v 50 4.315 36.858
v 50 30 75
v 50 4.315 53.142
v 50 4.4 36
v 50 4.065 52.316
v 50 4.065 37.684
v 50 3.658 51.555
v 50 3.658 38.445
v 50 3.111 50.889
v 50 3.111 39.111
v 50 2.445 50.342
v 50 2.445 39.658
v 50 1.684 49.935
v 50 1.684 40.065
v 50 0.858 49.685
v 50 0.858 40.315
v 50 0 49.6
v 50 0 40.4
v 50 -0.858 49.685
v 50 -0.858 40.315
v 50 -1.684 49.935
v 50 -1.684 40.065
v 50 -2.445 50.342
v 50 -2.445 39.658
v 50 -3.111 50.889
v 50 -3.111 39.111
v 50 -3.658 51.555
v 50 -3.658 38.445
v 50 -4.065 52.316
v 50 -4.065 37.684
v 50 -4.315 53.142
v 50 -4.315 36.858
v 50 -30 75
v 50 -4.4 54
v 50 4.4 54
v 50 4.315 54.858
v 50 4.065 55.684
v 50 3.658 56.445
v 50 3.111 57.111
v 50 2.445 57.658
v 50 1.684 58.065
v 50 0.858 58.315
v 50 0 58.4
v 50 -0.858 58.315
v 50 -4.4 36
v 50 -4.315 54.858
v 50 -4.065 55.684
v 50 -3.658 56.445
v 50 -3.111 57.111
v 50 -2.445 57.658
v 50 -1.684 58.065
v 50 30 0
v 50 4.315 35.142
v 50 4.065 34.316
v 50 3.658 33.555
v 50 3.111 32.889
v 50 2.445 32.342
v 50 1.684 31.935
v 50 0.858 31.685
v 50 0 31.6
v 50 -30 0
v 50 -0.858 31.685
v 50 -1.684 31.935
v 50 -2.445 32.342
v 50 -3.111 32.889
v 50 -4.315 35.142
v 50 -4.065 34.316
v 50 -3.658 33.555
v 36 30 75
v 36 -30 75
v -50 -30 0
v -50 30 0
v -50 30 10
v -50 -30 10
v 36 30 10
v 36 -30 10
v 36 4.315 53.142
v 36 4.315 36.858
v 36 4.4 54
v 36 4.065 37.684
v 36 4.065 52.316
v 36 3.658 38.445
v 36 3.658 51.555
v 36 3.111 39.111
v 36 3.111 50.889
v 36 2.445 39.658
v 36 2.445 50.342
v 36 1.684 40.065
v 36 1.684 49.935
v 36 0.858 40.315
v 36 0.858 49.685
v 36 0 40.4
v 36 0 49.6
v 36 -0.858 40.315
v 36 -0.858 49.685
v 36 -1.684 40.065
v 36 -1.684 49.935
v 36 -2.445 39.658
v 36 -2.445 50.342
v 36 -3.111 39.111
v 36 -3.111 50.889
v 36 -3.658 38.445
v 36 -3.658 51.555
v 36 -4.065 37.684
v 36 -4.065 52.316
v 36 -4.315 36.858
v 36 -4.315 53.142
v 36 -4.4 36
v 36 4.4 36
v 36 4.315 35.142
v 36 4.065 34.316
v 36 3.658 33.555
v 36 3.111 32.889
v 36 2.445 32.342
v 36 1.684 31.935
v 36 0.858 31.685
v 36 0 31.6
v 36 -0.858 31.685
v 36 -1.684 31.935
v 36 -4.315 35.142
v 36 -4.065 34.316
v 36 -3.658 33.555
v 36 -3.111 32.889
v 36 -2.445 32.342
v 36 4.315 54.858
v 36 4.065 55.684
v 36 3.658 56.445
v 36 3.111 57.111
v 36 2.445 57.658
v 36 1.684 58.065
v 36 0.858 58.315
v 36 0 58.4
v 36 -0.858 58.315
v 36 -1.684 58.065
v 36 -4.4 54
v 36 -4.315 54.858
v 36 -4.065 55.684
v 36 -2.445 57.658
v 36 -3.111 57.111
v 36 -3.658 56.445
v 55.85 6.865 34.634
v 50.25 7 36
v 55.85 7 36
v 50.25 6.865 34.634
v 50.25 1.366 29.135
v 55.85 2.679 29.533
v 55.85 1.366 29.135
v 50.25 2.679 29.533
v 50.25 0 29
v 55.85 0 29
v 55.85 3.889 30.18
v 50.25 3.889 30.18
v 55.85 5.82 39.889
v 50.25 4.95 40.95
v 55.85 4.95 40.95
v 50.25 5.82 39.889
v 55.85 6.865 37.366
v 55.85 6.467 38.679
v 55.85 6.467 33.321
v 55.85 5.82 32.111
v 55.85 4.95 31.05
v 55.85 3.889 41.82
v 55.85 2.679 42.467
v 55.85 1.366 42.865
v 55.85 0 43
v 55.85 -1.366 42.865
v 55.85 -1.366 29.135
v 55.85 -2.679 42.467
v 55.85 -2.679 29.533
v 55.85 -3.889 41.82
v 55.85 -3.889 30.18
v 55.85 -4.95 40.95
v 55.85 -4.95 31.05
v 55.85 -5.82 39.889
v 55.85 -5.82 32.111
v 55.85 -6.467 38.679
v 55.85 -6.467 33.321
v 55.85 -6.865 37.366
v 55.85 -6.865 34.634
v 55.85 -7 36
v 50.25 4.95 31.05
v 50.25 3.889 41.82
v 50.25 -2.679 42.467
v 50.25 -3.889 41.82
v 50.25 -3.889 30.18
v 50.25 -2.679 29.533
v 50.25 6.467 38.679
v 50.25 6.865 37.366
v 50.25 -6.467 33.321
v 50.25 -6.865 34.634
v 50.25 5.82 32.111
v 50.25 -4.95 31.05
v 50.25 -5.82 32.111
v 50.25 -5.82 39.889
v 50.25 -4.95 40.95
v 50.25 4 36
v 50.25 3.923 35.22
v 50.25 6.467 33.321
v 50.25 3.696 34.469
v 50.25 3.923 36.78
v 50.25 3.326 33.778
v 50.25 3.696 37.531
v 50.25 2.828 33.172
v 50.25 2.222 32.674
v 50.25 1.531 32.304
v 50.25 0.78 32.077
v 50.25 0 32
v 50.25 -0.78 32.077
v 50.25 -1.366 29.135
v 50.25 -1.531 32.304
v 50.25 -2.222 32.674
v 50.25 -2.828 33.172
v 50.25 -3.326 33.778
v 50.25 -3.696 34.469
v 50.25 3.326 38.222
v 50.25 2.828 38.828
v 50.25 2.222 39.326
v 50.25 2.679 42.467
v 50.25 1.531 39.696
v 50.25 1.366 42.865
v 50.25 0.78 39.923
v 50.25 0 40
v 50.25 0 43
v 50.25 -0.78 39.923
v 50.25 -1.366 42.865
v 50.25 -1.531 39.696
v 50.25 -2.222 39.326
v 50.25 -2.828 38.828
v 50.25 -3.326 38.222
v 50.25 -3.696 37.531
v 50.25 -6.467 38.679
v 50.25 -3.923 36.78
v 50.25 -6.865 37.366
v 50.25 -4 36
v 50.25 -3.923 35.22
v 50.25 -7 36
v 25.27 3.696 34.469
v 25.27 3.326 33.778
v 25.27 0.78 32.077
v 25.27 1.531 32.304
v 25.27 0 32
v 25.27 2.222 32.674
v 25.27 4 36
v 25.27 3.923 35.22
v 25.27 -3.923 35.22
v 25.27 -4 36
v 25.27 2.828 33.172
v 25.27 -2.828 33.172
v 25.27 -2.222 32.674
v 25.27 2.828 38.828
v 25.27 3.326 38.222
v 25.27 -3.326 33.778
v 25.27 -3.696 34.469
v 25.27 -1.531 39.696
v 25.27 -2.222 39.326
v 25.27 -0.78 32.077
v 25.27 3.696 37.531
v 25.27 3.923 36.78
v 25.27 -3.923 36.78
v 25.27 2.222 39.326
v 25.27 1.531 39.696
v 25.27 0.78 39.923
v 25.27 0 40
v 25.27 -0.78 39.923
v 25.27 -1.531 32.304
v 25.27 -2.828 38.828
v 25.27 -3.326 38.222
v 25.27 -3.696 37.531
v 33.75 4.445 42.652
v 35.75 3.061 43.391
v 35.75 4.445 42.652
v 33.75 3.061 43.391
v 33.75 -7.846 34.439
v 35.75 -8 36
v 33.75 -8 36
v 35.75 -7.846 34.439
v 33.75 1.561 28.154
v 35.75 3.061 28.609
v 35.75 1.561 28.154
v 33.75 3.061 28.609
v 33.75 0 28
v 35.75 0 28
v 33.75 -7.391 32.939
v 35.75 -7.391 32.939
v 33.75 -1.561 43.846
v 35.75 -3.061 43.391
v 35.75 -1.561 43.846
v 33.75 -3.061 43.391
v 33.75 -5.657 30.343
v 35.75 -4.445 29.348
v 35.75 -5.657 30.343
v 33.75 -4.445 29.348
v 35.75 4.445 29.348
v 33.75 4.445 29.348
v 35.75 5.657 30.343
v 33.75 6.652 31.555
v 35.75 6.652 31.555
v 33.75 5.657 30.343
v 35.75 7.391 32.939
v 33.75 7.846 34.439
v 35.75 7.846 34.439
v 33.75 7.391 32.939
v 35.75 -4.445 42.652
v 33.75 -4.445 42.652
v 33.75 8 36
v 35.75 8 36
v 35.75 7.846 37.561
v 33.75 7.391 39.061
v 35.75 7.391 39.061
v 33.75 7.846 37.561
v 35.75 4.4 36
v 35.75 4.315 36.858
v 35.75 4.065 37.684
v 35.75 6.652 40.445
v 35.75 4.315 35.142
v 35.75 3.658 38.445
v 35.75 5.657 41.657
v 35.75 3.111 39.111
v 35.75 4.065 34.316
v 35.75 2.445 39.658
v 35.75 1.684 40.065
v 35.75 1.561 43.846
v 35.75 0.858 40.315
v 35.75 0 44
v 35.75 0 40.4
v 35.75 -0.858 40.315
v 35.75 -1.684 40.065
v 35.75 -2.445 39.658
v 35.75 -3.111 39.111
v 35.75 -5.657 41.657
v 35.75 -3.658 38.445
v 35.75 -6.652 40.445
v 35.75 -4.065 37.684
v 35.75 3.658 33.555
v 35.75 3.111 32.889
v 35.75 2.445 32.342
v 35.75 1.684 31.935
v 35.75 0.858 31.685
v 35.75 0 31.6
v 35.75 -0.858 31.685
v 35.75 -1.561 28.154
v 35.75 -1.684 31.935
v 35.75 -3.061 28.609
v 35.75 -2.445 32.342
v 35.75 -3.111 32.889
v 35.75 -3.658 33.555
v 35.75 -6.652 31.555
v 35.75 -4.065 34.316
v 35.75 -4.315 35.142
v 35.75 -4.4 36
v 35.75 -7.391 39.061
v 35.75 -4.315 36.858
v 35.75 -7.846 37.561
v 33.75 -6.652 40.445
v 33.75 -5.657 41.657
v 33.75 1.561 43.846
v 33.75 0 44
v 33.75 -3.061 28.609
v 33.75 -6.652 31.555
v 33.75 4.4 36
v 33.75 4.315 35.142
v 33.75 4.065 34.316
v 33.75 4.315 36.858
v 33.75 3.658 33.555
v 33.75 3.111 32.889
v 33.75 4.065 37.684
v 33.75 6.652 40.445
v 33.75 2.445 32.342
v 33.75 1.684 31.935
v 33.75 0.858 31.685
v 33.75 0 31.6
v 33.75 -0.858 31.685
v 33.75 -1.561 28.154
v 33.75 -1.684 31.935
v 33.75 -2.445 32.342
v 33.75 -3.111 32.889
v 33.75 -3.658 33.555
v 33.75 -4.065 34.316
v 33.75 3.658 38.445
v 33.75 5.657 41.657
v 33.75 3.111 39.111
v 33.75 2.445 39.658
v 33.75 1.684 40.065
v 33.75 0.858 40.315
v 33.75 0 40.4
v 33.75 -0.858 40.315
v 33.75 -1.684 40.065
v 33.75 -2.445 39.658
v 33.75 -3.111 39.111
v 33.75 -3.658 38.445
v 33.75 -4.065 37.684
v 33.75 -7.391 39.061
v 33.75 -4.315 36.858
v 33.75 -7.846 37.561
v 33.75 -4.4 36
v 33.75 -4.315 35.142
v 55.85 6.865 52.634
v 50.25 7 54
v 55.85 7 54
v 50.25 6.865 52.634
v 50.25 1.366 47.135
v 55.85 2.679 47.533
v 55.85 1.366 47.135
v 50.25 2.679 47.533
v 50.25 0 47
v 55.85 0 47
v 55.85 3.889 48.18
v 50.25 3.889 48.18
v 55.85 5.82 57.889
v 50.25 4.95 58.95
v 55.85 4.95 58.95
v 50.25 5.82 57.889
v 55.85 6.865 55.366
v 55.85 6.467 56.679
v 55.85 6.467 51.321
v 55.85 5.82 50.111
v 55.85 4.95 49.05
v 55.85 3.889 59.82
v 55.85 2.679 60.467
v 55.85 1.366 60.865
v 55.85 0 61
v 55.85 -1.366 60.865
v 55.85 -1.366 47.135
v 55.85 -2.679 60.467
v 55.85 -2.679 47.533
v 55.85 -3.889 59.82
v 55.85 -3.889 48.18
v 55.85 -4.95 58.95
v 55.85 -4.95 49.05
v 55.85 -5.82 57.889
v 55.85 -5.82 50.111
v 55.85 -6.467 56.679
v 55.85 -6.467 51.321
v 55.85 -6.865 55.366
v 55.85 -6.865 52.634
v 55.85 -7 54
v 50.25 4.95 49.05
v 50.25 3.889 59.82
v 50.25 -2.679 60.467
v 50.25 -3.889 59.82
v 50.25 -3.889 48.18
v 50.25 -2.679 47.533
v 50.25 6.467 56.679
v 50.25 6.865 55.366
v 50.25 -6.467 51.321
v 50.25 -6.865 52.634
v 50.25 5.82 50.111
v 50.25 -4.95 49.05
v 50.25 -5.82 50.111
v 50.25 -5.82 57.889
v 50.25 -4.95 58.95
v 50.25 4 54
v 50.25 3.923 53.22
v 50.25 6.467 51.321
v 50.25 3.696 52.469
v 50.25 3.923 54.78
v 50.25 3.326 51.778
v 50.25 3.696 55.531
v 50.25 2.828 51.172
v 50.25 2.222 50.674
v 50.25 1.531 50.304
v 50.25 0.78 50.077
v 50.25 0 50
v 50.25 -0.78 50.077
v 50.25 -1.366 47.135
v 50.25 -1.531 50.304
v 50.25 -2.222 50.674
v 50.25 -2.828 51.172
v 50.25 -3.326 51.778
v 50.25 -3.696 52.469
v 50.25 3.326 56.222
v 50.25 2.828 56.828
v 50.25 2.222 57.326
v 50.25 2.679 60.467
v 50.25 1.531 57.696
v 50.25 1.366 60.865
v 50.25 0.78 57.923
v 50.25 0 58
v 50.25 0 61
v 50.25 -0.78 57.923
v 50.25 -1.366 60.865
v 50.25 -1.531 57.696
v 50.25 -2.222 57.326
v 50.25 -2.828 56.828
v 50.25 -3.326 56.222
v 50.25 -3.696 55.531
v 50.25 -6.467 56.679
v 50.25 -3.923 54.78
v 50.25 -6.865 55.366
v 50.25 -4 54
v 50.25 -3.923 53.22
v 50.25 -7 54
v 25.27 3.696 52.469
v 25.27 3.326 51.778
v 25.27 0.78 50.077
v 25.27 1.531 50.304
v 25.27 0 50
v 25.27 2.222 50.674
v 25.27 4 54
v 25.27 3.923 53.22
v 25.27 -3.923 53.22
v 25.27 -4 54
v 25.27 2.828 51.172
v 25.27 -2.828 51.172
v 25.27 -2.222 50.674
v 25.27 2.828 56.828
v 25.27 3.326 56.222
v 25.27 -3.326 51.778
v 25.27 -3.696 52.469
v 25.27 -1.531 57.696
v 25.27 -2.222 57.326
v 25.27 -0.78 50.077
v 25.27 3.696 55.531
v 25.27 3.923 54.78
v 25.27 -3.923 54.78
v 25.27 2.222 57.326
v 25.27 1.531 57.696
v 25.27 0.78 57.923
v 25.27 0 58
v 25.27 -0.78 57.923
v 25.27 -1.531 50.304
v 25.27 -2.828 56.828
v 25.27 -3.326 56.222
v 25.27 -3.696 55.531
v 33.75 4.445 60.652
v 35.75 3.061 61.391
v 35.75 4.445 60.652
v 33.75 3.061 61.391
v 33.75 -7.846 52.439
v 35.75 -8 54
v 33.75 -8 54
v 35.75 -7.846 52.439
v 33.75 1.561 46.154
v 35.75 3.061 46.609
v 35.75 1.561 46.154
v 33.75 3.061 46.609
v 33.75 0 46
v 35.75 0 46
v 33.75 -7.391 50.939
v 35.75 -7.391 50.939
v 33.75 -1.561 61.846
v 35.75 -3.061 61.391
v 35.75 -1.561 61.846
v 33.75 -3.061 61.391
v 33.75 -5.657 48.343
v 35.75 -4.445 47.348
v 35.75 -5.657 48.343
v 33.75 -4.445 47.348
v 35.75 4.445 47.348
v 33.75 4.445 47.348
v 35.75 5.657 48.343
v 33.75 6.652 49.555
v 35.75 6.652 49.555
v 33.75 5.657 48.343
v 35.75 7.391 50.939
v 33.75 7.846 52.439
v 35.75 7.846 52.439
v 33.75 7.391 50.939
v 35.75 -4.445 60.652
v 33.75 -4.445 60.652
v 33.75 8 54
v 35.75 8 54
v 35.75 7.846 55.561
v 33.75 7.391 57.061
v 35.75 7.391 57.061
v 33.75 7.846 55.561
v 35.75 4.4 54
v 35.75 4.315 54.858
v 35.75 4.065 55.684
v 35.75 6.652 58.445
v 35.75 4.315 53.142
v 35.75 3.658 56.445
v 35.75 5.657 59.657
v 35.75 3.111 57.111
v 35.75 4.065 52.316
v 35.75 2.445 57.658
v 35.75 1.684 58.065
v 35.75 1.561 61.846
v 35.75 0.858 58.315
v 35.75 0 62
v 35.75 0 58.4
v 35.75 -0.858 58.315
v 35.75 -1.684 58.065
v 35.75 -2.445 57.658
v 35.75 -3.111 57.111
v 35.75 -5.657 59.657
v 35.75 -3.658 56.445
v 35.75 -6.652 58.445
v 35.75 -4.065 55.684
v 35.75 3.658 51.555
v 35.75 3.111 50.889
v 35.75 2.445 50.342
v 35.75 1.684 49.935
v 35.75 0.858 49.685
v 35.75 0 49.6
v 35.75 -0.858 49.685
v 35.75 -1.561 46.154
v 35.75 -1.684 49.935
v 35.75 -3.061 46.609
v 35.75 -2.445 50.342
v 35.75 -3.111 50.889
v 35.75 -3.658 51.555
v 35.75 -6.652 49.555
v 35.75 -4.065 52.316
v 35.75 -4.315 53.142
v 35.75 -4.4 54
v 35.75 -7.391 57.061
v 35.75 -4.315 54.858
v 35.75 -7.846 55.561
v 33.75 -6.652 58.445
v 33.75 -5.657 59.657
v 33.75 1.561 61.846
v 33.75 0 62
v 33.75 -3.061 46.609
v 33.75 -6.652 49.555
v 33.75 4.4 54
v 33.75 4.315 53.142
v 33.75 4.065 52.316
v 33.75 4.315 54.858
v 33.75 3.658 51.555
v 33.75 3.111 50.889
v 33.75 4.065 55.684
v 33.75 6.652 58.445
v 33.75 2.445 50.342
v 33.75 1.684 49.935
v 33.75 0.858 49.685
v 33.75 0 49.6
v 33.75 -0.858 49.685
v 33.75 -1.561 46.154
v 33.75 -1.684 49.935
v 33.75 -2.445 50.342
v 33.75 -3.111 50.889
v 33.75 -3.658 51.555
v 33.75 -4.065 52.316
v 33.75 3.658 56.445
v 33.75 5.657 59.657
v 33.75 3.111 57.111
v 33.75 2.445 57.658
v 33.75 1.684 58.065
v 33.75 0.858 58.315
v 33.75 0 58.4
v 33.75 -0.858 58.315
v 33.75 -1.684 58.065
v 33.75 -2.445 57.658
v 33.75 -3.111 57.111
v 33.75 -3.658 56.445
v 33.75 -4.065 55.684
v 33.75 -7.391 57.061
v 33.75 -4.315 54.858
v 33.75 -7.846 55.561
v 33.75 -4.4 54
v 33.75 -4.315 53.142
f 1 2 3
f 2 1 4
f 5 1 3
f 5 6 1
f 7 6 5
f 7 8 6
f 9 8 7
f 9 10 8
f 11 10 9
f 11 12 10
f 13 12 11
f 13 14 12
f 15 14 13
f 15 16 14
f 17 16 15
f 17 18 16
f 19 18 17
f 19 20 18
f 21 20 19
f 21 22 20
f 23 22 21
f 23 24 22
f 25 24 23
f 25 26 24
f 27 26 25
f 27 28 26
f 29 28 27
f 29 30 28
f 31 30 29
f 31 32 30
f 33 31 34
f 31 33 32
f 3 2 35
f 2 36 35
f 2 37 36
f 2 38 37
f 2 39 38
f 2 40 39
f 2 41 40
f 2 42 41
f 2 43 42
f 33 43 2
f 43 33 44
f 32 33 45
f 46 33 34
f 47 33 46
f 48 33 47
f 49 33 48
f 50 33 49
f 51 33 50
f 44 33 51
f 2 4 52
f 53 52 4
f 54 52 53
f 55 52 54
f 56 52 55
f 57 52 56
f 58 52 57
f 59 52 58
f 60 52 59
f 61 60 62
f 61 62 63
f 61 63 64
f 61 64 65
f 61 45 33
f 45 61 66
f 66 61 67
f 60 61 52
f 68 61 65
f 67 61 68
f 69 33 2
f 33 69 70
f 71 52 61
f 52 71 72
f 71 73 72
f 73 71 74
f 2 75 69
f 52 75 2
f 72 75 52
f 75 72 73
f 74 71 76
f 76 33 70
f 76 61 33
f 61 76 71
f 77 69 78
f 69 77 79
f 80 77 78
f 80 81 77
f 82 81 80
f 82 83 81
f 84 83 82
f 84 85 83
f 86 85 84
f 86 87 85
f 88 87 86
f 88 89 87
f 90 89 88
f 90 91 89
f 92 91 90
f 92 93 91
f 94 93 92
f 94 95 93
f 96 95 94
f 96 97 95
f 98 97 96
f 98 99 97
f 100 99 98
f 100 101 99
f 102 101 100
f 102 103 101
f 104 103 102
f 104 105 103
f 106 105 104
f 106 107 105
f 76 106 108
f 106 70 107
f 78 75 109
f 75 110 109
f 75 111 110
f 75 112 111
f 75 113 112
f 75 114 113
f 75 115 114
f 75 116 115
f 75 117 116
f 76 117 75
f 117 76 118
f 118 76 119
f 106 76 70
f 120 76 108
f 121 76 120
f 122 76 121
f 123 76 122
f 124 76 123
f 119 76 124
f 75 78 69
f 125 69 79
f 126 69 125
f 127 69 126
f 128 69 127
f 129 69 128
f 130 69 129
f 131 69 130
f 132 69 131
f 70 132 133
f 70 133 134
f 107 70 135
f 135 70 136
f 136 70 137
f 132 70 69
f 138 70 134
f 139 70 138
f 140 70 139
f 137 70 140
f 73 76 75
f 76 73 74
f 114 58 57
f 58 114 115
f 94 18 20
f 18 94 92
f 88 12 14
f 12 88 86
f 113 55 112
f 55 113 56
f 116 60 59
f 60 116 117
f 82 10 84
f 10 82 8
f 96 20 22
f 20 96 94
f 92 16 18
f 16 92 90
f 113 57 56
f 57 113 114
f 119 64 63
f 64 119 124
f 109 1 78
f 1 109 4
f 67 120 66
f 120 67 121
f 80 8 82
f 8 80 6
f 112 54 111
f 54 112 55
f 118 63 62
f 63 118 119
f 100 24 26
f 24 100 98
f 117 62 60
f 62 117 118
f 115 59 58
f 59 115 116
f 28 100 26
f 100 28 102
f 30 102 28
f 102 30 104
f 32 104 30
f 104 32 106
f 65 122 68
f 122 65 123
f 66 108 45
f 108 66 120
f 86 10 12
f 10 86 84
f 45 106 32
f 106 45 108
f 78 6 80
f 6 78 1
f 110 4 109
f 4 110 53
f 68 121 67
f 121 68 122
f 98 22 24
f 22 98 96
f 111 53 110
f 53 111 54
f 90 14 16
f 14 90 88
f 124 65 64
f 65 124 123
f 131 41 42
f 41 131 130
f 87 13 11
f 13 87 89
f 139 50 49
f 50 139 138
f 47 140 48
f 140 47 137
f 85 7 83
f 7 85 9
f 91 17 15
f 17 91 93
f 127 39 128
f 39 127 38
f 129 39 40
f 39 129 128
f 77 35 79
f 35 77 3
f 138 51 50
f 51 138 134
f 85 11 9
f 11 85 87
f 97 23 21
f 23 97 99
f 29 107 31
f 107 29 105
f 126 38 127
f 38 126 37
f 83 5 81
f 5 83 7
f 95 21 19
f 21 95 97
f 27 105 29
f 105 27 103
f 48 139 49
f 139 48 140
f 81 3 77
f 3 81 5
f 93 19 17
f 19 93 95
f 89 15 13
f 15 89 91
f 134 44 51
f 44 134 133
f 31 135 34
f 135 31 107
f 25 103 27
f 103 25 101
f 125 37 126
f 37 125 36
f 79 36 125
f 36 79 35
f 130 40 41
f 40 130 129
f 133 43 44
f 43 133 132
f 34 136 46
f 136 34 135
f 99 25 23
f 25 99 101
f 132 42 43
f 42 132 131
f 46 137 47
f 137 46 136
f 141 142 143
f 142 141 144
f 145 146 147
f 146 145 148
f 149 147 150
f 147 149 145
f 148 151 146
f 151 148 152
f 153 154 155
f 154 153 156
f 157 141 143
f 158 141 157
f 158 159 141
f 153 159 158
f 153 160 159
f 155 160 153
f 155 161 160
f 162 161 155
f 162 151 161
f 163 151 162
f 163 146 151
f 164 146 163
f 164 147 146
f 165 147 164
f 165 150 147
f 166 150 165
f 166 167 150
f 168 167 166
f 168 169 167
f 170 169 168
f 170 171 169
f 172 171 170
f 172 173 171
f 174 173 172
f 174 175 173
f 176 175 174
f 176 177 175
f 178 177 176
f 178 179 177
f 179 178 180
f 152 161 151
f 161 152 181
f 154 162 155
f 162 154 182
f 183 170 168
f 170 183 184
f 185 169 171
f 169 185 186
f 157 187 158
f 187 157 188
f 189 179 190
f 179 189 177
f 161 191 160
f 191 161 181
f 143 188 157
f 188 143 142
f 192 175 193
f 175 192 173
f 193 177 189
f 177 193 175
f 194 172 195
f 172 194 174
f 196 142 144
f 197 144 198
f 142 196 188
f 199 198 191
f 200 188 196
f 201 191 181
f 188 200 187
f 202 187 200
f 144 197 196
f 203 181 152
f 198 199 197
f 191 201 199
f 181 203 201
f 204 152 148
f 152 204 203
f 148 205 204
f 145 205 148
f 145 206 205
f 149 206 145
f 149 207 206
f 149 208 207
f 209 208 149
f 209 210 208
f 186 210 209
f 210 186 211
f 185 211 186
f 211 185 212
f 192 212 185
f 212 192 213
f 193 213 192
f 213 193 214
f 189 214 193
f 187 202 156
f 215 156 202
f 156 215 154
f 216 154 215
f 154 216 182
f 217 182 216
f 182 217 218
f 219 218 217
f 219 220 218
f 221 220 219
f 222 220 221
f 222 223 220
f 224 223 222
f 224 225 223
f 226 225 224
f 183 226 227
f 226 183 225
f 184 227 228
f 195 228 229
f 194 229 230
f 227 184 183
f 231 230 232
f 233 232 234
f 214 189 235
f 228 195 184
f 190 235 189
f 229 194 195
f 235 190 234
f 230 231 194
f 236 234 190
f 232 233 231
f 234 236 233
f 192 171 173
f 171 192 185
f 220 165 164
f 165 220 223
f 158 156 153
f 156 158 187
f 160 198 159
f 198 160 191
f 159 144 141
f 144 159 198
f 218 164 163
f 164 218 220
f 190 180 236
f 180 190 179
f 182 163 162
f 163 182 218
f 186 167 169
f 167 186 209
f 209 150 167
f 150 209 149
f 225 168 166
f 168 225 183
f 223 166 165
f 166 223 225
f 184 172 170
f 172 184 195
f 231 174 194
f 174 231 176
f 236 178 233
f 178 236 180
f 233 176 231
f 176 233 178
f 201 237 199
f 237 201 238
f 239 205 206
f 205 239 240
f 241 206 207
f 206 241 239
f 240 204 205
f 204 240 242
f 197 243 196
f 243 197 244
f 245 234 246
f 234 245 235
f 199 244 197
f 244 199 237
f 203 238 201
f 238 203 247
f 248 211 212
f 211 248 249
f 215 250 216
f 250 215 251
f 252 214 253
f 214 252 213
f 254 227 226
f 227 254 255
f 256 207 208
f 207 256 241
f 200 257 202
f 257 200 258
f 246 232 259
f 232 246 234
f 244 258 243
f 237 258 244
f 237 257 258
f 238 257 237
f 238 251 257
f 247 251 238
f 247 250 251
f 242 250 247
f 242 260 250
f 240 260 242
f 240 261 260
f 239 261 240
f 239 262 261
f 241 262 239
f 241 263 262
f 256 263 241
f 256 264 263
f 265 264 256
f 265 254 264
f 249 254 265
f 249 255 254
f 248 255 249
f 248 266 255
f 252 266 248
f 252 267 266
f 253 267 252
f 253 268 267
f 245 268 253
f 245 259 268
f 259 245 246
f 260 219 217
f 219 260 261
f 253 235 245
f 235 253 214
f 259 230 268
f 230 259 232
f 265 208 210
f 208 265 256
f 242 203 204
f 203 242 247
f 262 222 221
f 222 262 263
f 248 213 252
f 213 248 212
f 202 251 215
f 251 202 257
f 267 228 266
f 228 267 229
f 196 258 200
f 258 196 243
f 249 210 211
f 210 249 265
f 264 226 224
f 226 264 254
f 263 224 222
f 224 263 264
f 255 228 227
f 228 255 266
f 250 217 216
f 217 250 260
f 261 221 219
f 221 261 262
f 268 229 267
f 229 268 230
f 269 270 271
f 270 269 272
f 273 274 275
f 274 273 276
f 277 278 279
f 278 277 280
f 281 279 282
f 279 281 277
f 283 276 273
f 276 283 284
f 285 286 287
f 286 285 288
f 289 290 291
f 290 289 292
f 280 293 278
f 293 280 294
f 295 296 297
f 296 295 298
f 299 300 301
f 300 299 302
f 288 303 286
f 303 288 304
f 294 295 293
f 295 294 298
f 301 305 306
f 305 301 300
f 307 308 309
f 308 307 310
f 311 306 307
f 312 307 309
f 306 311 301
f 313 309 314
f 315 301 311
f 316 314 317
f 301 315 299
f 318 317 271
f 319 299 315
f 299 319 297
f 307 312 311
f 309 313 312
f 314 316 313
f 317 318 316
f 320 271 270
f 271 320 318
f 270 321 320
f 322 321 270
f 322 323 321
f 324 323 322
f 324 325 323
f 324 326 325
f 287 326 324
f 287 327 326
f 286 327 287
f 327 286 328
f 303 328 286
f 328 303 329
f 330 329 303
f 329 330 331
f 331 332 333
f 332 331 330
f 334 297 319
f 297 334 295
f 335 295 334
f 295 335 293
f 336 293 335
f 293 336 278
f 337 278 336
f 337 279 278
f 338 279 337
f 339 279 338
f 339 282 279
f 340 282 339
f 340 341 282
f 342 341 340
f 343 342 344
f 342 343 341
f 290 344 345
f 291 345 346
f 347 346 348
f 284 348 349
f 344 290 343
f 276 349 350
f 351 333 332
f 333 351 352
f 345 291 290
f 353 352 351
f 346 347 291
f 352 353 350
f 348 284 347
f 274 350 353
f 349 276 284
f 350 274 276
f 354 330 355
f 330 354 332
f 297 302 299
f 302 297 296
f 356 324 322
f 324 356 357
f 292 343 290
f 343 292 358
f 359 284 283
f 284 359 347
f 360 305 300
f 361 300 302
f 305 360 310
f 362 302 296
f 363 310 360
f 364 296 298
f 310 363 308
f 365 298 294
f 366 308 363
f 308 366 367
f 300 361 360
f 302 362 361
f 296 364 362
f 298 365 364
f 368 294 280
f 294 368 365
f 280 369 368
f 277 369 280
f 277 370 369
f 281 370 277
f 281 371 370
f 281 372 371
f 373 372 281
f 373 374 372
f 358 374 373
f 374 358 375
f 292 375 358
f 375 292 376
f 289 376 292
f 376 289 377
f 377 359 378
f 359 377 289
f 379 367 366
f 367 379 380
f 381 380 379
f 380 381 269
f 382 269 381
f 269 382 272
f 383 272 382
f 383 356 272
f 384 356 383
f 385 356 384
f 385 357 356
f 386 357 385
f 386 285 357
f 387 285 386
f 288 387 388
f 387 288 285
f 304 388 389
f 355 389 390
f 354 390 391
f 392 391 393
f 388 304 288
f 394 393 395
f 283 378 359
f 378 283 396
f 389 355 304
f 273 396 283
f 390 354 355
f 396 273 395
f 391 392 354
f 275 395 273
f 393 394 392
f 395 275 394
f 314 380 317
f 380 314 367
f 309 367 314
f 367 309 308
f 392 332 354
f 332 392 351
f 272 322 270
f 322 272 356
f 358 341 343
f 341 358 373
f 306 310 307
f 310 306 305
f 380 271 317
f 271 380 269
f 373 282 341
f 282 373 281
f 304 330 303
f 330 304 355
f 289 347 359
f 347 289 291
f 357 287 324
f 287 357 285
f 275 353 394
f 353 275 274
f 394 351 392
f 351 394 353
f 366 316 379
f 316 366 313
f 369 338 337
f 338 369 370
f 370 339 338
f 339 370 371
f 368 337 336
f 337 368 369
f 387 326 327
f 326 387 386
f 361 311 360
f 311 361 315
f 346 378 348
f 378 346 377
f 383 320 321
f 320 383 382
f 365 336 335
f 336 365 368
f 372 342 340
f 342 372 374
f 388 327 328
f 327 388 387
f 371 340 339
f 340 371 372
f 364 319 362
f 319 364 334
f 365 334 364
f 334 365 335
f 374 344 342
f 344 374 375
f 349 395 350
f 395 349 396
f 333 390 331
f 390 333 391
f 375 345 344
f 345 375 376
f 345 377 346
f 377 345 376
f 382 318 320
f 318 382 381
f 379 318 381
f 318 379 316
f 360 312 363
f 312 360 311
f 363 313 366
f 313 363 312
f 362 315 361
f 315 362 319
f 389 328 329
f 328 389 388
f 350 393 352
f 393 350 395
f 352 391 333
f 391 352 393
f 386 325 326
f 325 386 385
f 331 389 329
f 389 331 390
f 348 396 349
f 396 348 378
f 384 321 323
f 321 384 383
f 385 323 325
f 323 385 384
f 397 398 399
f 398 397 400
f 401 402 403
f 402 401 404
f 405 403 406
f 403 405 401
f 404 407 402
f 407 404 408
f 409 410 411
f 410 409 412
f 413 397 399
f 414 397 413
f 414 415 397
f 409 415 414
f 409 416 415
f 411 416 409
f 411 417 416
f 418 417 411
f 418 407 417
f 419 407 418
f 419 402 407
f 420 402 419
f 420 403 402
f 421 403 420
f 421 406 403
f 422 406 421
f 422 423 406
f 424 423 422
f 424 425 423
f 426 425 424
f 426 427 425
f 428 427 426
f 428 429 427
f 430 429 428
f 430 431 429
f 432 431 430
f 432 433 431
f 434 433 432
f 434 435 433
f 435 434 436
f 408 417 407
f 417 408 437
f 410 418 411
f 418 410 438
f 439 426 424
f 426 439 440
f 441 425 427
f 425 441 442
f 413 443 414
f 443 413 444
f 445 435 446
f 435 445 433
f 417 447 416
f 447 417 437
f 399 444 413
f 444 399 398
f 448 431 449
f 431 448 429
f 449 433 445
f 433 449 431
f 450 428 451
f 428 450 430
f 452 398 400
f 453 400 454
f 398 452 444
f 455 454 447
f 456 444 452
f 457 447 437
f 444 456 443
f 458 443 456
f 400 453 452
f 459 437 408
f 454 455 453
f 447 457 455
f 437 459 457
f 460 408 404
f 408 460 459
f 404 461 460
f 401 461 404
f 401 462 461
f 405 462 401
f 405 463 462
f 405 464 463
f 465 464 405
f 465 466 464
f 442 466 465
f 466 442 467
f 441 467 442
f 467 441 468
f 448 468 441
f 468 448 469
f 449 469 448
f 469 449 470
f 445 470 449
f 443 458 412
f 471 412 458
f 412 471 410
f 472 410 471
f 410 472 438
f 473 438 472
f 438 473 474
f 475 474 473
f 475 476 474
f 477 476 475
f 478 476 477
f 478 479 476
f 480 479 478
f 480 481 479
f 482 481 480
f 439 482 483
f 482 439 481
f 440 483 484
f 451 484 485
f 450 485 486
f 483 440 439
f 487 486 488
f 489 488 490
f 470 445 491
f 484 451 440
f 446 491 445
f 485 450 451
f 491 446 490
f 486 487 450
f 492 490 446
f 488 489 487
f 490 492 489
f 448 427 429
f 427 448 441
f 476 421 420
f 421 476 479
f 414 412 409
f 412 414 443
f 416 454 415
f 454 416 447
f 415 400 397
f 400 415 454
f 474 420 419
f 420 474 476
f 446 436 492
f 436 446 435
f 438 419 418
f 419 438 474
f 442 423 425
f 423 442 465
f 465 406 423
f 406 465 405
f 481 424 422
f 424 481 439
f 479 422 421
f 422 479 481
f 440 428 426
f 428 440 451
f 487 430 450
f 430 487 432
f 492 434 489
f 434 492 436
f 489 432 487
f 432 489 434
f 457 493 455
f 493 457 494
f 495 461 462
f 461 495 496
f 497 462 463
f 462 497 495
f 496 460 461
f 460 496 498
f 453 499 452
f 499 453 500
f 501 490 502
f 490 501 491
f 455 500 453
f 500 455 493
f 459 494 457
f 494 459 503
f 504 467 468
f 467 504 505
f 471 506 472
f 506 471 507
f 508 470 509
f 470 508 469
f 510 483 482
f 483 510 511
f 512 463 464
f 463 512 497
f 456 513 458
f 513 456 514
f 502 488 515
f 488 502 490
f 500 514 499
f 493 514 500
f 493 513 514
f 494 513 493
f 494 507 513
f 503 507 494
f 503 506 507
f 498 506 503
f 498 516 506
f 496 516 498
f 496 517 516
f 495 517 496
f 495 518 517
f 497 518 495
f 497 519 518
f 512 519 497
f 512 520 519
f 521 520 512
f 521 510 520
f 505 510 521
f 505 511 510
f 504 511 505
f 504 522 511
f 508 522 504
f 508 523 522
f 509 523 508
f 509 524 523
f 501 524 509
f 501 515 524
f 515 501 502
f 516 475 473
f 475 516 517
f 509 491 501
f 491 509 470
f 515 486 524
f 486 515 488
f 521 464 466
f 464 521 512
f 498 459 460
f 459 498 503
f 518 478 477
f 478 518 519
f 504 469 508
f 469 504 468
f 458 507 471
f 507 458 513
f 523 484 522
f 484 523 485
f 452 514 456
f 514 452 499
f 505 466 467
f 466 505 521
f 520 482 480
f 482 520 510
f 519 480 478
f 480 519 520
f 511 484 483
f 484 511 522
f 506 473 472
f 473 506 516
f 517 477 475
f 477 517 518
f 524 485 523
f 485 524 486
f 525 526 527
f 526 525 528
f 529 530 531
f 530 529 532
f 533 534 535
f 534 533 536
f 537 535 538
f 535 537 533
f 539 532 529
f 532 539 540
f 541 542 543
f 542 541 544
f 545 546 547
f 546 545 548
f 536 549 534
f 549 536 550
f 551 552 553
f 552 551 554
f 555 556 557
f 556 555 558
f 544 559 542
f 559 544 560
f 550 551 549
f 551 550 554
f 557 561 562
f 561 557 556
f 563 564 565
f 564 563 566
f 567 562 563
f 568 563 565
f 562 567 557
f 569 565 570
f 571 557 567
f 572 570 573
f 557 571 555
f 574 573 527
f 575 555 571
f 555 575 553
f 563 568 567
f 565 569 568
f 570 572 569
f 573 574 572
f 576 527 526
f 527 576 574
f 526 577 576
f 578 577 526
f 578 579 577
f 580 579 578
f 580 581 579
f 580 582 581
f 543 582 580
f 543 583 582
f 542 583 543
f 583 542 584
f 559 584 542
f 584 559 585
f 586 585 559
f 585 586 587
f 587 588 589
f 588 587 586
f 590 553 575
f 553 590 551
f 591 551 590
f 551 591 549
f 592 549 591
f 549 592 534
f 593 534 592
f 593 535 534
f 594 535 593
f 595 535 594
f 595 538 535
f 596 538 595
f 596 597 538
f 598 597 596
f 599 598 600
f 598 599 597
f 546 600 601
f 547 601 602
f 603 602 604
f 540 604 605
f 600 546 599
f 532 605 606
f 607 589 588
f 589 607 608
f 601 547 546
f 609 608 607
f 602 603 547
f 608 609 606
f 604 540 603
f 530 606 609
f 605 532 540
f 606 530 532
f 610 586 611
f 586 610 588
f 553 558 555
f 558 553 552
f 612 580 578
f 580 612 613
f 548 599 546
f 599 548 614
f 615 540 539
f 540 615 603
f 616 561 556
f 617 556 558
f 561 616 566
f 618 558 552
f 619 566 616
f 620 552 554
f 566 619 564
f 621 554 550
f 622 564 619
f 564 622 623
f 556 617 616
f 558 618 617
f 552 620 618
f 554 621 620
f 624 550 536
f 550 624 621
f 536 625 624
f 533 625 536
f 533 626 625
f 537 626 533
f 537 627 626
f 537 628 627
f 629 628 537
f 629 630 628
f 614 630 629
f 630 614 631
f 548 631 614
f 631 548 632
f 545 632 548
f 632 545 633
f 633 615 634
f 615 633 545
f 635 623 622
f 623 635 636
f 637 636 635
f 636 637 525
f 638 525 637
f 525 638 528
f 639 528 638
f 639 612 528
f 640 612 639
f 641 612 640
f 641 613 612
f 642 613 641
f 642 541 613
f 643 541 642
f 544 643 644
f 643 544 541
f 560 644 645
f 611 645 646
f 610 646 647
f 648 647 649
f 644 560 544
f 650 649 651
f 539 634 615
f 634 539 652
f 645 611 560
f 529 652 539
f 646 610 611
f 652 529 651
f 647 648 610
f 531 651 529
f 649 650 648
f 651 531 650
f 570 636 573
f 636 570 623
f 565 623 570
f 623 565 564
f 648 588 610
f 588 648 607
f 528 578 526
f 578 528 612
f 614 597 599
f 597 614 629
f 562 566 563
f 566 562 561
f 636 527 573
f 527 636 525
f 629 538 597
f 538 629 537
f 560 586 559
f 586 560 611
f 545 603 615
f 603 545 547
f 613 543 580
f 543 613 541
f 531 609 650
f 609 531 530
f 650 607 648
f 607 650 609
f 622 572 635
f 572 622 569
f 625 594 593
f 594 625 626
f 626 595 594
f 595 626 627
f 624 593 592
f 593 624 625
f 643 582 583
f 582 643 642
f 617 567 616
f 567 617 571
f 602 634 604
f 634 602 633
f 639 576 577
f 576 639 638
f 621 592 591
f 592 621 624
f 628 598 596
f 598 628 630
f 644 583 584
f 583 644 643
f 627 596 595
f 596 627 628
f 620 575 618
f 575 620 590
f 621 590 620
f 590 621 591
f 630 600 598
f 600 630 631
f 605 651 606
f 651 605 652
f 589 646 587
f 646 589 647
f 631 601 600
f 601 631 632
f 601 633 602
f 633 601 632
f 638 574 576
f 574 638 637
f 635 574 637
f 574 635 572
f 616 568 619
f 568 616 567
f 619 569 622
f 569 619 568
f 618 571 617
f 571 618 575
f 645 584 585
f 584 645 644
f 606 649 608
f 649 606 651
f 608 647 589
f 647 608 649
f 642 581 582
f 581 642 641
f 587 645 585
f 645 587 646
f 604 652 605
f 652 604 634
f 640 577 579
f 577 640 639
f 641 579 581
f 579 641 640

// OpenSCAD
$fn = 32;

// ------------------------------------------------------------------------
// Bolted bracket: 100 x 60 mm bracket with 2 bolt joints
// Every part is its own module, assembly() places them once.
// ------------------------------------------------------------------------

// --- part 1 ---
module bracket() {
  difference() {
    translate([-50, -30, 0]) cube([100, 60, 75]);
    translate([-51, -31, 10]) cube([87, 62, 66]);
    translate([43, 0, 36]) rotate([0, 90, 0]) cylinder(h = 16, d = 8.8, center = true);
    translate([43, 0, 54]) rotate([0, 90, 0]) cylinder(h = 16, d = 8.8, center = true);
  }
}

// --- part 2 ---
module bolt1() {
  cylinder(h = 5.6, d = 14);
  translate([0, 0, -24.98]) cylinder(h = 24.98, d = 8);
}

// --- part 3 ---
module washer1() {
  difference() {
      translate([0, 0, 0]) cylinder(h = 2, d = 16);
      translate([0, 0, -1]) cylinder(h = 4, d = 8.8);
    }
}

// --- part 4 ---
module bolt2() {
  cylinder(h = 5.6, d = 14);
  translate([0, 0, -24.98]) cylinder(h = 24.98, d = 8);
}

// --- part 5 ---
module washer2() {
  difference() {
      translate([0, 0, 0]) cylinder(h = 2, d = 16);
      translate([0, 0, -1]) cylinder(h = 4, d = 8.8);
    }
}

// --- assembly ---
module assembly() {
  translate([0, 0, 0]) rotate([0, 0, 0]) bracket();
  translate([50.25, 0, 36]) rotate([0, 90, 0]) bolt1();
  translate([33.75, 0, 36]) rotate([0, 90, 0]) washer1();
  translate([50.25, 0, 54]) rotate([0, 90, 0]) bolt2();
  translate([33.75, 0, 54]) rotate([0, 90, 0]) washer2();
}

assembly();
